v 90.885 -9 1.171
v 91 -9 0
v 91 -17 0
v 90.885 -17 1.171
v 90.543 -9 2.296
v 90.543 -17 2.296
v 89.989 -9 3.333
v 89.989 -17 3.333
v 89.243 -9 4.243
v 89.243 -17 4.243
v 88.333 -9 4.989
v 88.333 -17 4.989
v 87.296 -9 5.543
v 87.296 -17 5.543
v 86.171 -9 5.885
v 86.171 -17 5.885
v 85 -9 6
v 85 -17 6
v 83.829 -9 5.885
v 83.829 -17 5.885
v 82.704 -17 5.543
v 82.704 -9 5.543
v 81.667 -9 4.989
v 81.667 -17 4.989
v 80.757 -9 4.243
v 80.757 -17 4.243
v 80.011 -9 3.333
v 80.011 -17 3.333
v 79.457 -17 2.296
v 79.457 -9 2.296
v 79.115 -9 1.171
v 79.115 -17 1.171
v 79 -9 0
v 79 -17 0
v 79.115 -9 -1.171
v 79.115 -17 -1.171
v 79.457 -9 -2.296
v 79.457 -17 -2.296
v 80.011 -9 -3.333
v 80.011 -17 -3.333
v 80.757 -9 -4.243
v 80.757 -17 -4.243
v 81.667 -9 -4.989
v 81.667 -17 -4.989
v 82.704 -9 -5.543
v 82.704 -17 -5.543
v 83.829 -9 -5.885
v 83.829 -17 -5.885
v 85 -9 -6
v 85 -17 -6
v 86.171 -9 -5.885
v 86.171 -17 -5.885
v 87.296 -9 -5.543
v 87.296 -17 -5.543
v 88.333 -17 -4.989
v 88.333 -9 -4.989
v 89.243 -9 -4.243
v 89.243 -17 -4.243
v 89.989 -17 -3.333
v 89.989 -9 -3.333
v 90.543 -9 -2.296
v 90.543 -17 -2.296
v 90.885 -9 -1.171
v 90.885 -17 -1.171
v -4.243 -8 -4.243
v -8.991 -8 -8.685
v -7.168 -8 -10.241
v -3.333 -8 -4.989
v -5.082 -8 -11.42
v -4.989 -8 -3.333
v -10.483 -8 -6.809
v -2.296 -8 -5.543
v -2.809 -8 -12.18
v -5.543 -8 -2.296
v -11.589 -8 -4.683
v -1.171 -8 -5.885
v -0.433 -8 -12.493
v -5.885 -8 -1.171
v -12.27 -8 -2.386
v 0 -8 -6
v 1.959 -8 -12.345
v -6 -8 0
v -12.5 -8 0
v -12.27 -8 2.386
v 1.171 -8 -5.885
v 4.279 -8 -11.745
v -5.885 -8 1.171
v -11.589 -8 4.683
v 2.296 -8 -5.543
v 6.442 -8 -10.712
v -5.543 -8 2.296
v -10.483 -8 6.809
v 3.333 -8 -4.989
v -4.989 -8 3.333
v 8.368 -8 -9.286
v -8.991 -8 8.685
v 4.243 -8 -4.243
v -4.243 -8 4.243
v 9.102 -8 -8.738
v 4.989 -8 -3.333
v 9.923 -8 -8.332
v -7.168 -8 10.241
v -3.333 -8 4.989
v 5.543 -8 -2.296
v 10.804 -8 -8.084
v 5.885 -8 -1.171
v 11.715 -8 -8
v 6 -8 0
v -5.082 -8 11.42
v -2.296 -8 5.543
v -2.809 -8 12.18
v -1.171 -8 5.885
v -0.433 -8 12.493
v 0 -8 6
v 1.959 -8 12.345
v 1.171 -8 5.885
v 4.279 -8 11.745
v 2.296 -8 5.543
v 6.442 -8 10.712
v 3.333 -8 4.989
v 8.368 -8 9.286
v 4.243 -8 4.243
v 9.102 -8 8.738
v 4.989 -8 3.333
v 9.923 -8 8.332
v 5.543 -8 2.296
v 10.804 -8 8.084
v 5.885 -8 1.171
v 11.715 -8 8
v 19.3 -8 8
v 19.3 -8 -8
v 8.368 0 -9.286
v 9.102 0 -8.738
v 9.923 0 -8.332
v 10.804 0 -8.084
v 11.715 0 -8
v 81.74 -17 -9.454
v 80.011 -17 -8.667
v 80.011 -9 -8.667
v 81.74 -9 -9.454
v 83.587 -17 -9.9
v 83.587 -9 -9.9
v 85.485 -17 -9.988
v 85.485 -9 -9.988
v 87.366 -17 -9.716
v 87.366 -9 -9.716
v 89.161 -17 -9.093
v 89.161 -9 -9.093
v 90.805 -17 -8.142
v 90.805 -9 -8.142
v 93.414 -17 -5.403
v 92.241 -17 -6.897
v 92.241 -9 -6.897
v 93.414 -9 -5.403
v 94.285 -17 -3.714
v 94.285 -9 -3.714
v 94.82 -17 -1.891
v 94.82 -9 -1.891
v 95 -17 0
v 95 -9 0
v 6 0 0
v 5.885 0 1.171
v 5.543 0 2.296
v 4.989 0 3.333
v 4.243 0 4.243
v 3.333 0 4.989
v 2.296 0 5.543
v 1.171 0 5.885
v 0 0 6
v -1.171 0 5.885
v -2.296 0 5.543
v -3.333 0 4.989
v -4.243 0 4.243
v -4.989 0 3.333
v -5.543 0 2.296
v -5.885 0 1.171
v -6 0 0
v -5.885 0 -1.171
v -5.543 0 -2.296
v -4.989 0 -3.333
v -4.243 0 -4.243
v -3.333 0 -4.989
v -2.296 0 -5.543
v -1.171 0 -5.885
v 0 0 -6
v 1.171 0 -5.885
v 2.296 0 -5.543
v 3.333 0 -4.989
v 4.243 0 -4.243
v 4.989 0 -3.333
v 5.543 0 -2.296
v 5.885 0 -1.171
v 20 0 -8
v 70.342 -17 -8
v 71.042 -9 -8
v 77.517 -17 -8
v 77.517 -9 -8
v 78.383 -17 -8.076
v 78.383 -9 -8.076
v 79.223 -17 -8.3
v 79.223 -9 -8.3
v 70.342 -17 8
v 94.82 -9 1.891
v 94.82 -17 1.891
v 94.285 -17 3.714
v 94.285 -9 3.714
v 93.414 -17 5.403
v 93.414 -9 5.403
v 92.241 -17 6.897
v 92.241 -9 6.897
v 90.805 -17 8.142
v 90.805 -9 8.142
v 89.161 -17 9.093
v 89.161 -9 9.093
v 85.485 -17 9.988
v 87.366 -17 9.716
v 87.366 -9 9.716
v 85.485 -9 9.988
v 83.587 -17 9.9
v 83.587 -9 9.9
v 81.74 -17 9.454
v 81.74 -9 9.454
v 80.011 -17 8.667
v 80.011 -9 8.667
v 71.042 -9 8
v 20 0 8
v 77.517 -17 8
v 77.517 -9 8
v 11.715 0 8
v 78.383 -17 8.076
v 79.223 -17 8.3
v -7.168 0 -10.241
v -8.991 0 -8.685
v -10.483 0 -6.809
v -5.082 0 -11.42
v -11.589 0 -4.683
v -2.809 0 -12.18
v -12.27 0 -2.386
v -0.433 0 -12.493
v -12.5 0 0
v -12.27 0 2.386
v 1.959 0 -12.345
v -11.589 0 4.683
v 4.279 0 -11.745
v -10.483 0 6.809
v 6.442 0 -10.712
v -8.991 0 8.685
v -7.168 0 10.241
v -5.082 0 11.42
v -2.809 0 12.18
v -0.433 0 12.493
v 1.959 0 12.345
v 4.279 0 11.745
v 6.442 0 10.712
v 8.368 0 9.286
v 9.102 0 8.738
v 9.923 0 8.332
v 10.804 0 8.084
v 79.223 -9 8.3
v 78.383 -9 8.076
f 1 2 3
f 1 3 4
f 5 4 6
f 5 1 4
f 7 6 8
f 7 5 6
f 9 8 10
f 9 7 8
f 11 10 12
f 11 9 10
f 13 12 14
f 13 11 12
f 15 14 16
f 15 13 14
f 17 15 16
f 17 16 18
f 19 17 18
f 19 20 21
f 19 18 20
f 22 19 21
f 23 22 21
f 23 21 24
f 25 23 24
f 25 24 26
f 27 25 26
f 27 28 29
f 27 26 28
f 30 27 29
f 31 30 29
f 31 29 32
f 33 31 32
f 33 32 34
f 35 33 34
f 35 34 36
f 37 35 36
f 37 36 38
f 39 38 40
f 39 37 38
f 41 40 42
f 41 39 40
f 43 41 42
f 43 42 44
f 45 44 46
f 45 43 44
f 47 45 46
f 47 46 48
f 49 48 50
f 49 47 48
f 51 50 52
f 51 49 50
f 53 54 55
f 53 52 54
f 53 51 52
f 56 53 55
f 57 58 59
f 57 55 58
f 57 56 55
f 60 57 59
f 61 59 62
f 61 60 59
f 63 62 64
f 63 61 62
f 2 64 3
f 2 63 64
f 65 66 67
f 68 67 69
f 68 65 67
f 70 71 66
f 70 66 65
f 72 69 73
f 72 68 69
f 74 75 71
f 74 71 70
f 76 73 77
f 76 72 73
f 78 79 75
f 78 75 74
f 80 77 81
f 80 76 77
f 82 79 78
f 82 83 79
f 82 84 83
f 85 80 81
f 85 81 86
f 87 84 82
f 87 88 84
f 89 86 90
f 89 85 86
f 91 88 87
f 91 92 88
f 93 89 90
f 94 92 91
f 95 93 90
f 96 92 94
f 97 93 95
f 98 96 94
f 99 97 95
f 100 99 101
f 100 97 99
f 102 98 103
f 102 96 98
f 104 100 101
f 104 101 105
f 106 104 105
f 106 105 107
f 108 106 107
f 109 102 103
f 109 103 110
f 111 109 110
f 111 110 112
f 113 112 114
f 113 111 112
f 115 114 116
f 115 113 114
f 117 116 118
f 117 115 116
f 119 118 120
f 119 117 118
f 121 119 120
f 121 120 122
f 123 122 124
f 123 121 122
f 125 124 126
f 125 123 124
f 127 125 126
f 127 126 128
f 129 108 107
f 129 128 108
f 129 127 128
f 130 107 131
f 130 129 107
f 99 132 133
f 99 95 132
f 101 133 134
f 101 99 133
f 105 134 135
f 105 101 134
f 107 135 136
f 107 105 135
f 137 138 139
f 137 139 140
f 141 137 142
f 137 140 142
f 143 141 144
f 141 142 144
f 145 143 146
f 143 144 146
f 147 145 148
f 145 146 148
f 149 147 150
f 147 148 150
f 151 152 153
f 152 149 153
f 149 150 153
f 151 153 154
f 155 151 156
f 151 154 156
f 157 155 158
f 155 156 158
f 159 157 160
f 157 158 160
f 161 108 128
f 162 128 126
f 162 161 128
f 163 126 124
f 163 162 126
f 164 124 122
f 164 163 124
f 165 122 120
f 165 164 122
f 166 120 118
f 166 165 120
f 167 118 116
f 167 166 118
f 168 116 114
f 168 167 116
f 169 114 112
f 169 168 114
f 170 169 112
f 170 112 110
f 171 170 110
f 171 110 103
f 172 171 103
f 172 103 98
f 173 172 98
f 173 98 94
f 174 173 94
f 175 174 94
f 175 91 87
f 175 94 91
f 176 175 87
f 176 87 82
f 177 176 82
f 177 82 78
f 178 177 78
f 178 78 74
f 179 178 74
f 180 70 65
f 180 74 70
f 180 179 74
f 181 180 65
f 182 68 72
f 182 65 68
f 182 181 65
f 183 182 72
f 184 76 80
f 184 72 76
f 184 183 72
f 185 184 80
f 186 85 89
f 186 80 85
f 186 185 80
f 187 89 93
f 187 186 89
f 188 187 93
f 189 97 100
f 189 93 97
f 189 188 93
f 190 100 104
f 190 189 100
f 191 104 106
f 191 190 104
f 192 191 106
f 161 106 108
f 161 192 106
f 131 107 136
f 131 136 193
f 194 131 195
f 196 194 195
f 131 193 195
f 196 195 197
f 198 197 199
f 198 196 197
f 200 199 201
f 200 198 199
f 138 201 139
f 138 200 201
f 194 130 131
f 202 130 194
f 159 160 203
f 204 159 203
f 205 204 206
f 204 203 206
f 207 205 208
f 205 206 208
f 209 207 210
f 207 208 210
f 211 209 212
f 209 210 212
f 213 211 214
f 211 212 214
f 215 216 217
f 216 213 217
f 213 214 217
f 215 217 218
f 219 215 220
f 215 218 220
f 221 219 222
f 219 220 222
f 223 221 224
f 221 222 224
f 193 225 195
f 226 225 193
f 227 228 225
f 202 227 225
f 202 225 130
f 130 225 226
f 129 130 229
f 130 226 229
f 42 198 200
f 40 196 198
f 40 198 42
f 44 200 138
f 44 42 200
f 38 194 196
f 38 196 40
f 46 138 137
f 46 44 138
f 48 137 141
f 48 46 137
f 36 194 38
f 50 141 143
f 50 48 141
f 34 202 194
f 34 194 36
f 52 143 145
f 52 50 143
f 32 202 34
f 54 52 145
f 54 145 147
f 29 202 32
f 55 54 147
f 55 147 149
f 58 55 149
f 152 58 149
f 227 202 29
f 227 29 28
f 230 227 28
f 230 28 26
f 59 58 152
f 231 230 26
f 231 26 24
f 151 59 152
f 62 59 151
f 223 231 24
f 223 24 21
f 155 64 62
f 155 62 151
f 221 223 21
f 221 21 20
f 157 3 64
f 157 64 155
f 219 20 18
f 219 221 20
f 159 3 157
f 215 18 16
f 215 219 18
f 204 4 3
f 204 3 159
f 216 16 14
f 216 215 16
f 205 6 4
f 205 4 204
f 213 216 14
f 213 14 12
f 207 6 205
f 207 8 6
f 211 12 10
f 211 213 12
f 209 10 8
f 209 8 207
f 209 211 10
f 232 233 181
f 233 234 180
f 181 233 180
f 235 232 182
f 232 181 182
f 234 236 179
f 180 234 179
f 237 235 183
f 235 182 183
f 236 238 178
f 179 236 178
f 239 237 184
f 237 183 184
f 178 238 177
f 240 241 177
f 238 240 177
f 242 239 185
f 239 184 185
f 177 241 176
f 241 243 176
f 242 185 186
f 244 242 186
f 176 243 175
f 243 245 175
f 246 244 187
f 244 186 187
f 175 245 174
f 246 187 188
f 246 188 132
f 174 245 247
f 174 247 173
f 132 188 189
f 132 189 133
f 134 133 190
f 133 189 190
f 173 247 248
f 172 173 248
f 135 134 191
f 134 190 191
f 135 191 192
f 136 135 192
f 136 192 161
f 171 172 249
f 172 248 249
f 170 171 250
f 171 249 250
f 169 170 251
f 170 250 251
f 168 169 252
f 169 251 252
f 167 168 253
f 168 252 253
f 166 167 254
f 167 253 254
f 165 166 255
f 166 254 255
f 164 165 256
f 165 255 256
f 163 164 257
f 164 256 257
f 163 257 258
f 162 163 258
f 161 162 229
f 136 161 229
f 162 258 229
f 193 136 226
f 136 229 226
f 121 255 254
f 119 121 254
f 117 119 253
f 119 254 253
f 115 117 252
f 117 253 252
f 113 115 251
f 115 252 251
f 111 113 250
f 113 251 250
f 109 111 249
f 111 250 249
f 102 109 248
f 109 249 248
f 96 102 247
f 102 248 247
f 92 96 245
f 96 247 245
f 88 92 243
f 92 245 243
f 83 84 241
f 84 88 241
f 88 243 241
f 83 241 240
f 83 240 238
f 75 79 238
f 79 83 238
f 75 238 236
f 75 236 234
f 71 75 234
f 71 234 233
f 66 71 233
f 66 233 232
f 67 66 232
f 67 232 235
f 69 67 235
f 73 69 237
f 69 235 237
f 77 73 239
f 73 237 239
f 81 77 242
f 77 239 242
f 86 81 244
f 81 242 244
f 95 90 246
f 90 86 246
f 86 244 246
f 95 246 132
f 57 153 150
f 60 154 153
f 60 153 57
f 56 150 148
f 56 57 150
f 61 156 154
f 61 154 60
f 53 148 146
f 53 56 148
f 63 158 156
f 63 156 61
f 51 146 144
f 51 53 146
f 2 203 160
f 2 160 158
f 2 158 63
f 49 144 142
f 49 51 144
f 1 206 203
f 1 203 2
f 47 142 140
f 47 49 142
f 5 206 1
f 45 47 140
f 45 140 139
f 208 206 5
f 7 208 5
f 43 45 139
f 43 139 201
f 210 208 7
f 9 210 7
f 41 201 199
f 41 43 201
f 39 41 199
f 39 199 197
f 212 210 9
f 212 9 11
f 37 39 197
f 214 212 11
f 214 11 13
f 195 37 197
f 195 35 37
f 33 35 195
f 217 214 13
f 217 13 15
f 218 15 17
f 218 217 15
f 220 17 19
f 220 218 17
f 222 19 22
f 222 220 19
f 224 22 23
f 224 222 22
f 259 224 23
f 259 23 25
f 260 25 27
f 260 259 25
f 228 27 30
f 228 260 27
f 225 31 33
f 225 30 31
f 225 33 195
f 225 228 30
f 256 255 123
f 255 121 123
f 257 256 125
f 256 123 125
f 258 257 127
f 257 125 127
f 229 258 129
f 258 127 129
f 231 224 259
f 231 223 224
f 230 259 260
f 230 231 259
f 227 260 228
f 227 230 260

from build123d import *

# Parameters (mm, degrees)
F0_R     = 6
F1_DEPTH = 25
F3_DEPTH = 12.5
F4_R     = 5


with BuildPart() as f1:
    # F0 (on Front) → F1 (new body)
    with BuildSketch(Plane.XZ):
        with BuildLine():
            ThreePointArc((9.604686, -8), (11.753905, -4.253905), (12.5, 0))
            ThreePointArc((12.5, 0), (11.753905, 4.253905), (9.604686, 8))
            ThreePointArc((9.604686, 8), (-12.5, 0), (9.604686, -8))
        make_face()
        Circle(F0_R, mode=Mode.SUBTRACT)
        with BuildLine():
            ThreePointArc((9.604686, 8), (11.753905, 4.253905), (12.5, 0))
            ThreePointArc((12.5, 0), (11.753905, -4.253905), (9.604686, -8))
            Line((9.604686, -8), (79, -8))
            ThreePointArc((79, -8), (75, 0), (79, 8))
            Line((79, 8), (9.604686, 8))
        make_face()
        with BuildLine():
            ThreePointArc((95, 0), (89.472136, 8.944272), (79, 8))
            ThreePointArc((79, 8), (75, 0), (79, -8))
            ThreePointArc((79, -8), (89.472136, -8.944272), (95, 0))
        make_face()
        with Locations((85, 0)):
            Circle(F0_R, mode=Mode.SUBTRACT)
    extrude(amount=F1_DEPTH)

    # F2 (on Top) → F3 (intersect, symmetric)
    with BuildSketch(Plane.XY):
        Polygon((20, 0), (-12.5, 0), (-12.5, -8), (19.300091, -8), (70.341627, -17), (95, -17), (95, -9), (71.041536, -9), align=None)
    extrude(amount=F3_DEPTH, both=True, mode=Mode.INTERSECT)

    # F4
    f4_edges = [f1.edges().sort_by_distance(p)[0] for p in [
        (79, -13, 8),
        (9.604686, -4, 8),
        (79, -13, -8),
        (9.604686, -4, -8),
    ]]
    fillet(f4_edges, radius=F4_R)


solid = f1.part
